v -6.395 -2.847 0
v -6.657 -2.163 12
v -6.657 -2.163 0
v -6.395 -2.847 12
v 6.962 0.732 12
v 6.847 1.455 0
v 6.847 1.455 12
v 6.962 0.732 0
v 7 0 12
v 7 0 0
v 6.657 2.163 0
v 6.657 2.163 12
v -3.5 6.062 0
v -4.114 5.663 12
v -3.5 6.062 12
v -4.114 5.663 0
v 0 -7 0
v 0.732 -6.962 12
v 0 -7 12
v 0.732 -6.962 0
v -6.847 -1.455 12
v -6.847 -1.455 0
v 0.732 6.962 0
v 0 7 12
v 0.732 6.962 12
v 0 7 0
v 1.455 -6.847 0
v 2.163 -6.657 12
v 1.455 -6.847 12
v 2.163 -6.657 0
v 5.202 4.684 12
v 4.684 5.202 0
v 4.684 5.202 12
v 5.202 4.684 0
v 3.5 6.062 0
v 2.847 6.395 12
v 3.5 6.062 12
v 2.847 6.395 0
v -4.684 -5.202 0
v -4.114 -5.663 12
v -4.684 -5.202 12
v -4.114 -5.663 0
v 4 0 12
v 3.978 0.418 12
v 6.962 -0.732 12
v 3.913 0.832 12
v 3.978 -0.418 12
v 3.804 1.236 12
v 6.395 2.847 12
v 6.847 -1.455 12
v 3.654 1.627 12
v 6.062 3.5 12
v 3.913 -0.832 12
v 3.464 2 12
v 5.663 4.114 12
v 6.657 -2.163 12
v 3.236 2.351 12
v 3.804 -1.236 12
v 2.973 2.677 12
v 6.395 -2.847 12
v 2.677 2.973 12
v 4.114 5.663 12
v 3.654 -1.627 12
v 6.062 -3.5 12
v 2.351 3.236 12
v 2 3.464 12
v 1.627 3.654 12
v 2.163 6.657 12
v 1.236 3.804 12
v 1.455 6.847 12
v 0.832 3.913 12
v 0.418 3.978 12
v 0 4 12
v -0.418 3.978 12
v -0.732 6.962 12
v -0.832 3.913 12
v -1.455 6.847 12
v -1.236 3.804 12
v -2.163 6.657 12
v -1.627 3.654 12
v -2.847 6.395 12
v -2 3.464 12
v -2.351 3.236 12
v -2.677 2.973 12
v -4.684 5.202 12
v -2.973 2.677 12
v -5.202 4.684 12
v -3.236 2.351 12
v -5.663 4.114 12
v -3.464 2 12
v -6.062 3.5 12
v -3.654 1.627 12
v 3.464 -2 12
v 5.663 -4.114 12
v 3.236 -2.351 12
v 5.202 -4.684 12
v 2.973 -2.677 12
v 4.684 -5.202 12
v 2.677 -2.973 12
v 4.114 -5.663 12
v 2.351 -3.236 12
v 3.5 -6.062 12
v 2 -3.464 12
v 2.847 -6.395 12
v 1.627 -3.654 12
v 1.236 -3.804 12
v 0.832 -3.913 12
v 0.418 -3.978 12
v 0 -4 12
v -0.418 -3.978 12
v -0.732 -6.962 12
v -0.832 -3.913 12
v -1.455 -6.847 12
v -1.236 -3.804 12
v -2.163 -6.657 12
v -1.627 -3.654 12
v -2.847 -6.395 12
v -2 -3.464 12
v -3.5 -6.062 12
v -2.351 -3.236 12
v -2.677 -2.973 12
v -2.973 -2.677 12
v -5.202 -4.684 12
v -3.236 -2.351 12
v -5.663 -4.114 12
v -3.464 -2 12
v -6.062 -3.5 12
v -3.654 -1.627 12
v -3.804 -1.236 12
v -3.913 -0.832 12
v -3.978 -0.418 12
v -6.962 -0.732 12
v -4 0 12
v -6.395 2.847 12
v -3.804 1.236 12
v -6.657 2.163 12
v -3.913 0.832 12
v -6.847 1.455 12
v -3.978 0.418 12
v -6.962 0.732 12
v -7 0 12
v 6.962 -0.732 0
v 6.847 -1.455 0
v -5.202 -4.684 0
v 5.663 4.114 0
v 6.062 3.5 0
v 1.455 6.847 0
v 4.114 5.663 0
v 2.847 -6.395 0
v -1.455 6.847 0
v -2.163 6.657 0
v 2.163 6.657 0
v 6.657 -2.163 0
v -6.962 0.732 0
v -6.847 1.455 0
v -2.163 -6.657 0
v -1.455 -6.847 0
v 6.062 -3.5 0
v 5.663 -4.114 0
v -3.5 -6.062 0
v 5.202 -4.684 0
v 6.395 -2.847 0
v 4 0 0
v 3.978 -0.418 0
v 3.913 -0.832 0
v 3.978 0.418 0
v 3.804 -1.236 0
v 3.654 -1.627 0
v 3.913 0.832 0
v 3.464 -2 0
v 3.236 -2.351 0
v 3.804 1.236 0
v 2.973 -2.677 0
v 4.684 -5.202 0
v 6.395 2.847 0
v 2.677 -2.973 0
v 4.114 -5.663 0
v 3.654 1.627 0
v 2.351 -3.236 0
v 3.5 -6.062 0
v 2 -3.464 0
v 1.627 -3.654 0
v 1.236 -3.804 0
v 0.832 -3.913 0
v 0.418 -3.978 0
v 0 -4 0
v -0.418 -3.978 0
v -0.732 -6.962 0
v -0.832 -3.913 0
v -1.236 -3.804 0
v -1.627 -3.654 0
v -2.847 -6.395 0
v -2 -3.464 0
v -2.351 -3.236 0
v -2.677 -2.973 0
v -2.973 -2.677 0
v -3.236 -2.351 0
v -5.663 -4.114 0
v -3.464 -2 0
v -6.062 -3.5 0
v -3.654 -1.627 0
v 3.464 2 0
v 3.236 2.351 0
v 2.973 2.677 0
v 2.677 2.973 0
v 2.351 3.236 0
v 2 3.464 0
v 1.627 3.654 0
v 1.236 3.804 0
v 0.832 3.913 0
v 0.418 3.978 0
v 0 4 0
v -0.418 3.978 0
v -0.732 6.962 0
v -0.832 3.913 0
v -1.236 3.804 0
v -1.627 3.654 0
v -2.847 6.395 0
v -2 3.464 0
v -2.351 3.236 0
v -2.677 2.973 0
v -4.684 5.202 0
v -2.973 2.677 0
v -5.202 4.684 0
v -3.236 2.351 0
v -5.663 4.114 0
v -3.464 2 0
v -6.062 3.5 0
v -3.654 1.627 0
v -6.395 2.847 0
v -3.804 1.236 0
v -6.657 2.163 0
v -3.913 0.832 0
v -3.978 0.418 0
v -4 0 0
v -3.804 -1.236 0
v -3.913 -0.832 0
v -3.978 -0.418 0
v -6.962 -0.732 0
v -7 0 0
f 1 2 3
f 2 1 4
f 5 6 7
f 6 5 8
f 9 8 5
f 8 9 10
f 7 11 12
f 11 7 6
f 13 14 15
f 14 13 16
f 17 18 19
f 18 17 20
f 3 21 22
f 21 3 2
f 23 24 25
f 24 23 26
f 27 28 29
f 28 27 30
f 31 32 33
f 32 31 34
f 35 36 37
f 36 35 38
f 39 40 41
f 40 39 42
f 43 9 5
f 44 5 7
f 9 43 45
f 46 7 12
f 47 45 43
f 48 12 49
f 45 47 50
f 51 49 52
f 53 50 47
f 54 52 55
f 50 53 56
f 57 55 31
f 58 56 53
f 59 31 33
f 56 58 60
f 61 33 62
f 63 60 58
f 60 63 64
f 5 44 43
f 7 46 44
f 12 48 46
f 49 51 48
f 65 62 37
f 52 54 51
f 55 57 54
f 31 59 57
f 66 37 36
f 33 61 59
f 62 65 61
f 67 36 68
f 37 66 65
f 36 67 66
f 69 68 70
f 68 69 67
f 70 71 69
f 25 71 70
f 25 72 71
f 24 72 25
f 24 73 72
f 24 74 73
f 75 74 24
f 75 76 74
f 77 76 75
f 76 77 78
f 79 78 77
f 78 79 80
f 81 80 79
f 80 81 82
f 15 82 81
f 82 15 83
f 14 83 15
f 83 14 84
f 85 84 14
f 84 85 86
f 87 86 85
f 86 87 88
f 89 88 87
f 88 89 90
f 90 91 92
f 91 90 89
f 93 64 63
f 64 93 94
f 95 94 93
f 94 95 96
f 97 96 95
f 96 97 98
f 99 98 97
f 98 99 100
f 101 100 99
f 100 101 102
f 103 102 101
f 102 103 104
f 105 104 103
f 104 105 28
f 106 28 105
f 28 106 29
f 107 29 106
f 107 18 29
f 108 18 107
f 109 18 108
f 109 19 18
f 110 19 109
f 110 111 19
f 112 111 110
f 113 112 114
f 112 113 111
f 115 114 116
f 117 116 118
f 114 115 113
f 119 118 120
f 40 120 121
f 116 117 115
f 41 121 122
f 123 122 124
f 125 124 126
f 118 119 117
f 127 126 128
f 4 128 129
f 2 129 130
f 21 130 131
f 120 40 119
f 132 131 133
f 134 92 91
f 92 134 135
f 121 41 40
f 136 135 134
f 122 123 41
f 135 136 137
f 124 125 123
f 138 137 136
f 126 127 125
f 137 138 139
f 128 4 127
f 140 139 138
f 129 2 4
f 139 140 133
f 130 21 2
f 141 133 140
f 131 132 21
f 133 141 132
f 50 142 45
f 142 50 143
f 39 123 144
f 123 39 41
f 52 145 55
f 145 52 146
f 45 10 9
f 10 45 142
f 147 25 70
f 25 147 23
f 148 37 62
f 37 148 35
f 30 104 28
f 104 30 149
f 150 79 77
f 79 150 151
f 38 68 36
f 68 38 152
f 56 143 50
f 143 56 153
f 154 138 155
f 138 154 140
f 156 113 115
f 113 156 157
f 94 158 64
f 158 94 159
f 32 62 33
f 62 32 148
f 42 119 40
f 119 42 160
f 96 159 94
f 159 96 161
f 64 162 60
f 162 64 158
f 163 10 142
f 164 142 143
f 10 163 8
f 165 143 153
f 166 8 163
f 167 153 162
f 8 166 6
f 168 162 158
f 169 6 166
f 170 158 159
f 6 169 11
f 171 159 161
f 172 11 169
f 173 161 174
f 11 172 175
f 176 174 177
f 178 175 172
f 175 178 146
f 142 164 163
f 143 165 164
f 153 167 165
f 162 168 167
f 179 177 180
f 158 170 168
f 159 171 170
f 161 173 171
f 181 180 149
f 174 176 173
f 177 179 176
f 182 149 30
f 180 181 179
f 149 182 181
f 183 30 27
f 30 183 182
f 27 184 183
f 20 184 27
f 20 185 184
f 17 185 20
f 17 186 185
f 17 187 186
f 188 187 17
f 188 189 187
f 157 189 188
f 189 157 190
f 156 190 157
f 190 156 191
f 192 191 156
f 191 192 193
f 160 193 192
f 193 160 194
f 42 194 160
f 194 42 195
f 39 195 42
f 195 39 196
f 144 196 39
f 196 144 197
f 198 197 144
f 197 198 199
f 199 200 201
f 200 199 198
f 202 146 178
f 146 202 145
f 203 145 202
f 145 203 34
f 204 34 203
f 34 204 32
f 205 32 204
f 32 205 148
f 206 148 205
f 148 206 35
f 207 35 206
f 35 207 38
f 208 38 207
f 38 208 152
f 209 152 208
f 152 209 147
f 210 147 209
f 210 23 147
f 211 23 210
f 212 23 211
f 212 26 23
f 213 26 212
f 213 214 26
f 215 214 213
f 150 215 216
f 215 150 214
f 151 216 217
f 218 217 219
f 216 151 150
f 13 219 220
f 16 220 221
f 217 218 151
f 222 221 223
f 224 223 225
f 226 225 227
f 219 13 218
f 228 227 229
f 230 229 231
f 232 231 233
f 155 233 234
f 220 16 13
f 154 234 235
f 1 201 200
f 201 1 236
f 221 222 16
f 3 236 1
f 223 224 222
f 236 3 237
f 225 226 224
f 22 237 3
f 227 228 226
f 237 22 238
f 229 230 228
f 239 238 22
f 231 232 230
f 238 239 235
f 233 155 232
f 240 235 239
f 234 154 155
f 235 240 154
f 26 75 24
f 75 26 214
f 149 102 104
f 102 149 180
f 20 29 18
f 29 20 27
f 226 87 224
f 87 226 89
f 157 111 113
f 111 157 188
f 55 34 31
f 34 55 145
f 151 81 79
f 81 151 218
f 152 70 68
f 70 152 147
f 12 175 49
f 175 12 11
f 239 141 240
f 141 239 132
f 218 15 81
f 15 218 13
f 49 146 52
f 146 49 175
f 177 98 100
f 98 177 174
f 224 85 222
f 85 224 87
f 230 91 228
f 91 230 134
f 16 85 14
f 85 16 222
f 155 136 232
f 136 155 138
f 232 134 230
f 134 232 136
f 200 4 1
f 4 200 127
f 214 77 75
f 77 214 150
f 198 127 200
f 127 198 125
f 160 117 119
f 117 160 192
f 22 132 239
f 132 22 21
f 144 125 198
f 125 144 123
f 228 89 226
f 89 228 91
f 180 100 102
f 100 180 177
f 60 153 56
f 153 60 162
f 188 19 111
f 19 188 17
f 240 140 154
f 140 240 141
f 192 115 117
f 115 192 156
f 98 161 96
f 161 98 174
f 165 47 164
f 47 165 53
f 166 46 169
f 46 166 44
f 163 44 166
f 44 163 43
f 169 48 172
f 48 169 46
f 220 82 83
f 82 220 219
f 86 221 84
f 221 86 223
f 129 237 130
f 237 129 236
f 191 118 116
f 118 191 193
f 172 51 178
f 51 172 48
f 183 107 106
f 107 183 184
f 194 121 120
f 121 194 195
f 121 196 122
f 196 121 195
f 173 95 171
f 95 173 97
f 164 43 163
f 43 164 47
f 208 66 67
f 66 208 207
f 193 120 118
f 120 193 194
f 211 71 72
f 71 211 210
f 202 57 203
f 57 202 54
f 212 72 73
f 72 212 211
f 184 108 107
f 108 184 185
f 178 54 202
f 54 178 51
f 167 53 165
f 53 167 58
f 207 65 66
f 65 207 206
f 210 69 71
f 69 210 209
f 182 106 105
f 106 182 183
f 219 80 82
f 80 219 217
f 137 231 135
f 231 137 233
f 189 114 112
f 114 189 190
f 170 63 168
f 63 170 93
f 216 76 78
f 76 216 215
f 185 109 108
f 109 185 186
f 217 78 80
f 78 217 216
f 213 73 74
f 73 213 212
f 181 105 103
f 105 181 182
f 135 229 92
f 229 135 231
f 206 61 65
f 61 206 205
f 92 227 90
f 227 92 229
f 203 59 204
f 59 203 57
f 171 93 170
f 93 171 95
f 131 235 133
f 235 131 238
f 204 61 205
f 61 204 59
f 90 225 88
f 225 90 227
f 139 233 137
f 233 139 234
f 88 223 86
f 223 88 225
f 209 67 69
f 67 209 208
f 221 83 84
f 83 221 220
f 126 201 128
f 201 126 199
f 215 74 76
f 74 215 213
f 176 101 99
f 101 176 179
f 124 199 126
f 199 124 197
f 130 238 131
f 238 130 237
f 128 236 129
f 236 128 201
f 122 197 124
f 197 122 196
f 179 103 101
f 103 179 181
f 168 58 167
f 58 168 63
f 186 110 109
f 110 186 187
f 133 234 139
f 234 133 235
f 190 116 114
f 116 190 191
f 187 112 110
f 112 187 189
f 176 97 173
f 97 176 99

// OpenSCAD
// Axle spacer tube.
$fn = 60;
eps = 0.02;
inner_d = 8;
outer_d = 14;
length = 12;
difference() { cylinder(d = outer_d, h = length); translate([0,0,-eps]) cylinder(d = inner_d, h = length + 2 * eps); }
